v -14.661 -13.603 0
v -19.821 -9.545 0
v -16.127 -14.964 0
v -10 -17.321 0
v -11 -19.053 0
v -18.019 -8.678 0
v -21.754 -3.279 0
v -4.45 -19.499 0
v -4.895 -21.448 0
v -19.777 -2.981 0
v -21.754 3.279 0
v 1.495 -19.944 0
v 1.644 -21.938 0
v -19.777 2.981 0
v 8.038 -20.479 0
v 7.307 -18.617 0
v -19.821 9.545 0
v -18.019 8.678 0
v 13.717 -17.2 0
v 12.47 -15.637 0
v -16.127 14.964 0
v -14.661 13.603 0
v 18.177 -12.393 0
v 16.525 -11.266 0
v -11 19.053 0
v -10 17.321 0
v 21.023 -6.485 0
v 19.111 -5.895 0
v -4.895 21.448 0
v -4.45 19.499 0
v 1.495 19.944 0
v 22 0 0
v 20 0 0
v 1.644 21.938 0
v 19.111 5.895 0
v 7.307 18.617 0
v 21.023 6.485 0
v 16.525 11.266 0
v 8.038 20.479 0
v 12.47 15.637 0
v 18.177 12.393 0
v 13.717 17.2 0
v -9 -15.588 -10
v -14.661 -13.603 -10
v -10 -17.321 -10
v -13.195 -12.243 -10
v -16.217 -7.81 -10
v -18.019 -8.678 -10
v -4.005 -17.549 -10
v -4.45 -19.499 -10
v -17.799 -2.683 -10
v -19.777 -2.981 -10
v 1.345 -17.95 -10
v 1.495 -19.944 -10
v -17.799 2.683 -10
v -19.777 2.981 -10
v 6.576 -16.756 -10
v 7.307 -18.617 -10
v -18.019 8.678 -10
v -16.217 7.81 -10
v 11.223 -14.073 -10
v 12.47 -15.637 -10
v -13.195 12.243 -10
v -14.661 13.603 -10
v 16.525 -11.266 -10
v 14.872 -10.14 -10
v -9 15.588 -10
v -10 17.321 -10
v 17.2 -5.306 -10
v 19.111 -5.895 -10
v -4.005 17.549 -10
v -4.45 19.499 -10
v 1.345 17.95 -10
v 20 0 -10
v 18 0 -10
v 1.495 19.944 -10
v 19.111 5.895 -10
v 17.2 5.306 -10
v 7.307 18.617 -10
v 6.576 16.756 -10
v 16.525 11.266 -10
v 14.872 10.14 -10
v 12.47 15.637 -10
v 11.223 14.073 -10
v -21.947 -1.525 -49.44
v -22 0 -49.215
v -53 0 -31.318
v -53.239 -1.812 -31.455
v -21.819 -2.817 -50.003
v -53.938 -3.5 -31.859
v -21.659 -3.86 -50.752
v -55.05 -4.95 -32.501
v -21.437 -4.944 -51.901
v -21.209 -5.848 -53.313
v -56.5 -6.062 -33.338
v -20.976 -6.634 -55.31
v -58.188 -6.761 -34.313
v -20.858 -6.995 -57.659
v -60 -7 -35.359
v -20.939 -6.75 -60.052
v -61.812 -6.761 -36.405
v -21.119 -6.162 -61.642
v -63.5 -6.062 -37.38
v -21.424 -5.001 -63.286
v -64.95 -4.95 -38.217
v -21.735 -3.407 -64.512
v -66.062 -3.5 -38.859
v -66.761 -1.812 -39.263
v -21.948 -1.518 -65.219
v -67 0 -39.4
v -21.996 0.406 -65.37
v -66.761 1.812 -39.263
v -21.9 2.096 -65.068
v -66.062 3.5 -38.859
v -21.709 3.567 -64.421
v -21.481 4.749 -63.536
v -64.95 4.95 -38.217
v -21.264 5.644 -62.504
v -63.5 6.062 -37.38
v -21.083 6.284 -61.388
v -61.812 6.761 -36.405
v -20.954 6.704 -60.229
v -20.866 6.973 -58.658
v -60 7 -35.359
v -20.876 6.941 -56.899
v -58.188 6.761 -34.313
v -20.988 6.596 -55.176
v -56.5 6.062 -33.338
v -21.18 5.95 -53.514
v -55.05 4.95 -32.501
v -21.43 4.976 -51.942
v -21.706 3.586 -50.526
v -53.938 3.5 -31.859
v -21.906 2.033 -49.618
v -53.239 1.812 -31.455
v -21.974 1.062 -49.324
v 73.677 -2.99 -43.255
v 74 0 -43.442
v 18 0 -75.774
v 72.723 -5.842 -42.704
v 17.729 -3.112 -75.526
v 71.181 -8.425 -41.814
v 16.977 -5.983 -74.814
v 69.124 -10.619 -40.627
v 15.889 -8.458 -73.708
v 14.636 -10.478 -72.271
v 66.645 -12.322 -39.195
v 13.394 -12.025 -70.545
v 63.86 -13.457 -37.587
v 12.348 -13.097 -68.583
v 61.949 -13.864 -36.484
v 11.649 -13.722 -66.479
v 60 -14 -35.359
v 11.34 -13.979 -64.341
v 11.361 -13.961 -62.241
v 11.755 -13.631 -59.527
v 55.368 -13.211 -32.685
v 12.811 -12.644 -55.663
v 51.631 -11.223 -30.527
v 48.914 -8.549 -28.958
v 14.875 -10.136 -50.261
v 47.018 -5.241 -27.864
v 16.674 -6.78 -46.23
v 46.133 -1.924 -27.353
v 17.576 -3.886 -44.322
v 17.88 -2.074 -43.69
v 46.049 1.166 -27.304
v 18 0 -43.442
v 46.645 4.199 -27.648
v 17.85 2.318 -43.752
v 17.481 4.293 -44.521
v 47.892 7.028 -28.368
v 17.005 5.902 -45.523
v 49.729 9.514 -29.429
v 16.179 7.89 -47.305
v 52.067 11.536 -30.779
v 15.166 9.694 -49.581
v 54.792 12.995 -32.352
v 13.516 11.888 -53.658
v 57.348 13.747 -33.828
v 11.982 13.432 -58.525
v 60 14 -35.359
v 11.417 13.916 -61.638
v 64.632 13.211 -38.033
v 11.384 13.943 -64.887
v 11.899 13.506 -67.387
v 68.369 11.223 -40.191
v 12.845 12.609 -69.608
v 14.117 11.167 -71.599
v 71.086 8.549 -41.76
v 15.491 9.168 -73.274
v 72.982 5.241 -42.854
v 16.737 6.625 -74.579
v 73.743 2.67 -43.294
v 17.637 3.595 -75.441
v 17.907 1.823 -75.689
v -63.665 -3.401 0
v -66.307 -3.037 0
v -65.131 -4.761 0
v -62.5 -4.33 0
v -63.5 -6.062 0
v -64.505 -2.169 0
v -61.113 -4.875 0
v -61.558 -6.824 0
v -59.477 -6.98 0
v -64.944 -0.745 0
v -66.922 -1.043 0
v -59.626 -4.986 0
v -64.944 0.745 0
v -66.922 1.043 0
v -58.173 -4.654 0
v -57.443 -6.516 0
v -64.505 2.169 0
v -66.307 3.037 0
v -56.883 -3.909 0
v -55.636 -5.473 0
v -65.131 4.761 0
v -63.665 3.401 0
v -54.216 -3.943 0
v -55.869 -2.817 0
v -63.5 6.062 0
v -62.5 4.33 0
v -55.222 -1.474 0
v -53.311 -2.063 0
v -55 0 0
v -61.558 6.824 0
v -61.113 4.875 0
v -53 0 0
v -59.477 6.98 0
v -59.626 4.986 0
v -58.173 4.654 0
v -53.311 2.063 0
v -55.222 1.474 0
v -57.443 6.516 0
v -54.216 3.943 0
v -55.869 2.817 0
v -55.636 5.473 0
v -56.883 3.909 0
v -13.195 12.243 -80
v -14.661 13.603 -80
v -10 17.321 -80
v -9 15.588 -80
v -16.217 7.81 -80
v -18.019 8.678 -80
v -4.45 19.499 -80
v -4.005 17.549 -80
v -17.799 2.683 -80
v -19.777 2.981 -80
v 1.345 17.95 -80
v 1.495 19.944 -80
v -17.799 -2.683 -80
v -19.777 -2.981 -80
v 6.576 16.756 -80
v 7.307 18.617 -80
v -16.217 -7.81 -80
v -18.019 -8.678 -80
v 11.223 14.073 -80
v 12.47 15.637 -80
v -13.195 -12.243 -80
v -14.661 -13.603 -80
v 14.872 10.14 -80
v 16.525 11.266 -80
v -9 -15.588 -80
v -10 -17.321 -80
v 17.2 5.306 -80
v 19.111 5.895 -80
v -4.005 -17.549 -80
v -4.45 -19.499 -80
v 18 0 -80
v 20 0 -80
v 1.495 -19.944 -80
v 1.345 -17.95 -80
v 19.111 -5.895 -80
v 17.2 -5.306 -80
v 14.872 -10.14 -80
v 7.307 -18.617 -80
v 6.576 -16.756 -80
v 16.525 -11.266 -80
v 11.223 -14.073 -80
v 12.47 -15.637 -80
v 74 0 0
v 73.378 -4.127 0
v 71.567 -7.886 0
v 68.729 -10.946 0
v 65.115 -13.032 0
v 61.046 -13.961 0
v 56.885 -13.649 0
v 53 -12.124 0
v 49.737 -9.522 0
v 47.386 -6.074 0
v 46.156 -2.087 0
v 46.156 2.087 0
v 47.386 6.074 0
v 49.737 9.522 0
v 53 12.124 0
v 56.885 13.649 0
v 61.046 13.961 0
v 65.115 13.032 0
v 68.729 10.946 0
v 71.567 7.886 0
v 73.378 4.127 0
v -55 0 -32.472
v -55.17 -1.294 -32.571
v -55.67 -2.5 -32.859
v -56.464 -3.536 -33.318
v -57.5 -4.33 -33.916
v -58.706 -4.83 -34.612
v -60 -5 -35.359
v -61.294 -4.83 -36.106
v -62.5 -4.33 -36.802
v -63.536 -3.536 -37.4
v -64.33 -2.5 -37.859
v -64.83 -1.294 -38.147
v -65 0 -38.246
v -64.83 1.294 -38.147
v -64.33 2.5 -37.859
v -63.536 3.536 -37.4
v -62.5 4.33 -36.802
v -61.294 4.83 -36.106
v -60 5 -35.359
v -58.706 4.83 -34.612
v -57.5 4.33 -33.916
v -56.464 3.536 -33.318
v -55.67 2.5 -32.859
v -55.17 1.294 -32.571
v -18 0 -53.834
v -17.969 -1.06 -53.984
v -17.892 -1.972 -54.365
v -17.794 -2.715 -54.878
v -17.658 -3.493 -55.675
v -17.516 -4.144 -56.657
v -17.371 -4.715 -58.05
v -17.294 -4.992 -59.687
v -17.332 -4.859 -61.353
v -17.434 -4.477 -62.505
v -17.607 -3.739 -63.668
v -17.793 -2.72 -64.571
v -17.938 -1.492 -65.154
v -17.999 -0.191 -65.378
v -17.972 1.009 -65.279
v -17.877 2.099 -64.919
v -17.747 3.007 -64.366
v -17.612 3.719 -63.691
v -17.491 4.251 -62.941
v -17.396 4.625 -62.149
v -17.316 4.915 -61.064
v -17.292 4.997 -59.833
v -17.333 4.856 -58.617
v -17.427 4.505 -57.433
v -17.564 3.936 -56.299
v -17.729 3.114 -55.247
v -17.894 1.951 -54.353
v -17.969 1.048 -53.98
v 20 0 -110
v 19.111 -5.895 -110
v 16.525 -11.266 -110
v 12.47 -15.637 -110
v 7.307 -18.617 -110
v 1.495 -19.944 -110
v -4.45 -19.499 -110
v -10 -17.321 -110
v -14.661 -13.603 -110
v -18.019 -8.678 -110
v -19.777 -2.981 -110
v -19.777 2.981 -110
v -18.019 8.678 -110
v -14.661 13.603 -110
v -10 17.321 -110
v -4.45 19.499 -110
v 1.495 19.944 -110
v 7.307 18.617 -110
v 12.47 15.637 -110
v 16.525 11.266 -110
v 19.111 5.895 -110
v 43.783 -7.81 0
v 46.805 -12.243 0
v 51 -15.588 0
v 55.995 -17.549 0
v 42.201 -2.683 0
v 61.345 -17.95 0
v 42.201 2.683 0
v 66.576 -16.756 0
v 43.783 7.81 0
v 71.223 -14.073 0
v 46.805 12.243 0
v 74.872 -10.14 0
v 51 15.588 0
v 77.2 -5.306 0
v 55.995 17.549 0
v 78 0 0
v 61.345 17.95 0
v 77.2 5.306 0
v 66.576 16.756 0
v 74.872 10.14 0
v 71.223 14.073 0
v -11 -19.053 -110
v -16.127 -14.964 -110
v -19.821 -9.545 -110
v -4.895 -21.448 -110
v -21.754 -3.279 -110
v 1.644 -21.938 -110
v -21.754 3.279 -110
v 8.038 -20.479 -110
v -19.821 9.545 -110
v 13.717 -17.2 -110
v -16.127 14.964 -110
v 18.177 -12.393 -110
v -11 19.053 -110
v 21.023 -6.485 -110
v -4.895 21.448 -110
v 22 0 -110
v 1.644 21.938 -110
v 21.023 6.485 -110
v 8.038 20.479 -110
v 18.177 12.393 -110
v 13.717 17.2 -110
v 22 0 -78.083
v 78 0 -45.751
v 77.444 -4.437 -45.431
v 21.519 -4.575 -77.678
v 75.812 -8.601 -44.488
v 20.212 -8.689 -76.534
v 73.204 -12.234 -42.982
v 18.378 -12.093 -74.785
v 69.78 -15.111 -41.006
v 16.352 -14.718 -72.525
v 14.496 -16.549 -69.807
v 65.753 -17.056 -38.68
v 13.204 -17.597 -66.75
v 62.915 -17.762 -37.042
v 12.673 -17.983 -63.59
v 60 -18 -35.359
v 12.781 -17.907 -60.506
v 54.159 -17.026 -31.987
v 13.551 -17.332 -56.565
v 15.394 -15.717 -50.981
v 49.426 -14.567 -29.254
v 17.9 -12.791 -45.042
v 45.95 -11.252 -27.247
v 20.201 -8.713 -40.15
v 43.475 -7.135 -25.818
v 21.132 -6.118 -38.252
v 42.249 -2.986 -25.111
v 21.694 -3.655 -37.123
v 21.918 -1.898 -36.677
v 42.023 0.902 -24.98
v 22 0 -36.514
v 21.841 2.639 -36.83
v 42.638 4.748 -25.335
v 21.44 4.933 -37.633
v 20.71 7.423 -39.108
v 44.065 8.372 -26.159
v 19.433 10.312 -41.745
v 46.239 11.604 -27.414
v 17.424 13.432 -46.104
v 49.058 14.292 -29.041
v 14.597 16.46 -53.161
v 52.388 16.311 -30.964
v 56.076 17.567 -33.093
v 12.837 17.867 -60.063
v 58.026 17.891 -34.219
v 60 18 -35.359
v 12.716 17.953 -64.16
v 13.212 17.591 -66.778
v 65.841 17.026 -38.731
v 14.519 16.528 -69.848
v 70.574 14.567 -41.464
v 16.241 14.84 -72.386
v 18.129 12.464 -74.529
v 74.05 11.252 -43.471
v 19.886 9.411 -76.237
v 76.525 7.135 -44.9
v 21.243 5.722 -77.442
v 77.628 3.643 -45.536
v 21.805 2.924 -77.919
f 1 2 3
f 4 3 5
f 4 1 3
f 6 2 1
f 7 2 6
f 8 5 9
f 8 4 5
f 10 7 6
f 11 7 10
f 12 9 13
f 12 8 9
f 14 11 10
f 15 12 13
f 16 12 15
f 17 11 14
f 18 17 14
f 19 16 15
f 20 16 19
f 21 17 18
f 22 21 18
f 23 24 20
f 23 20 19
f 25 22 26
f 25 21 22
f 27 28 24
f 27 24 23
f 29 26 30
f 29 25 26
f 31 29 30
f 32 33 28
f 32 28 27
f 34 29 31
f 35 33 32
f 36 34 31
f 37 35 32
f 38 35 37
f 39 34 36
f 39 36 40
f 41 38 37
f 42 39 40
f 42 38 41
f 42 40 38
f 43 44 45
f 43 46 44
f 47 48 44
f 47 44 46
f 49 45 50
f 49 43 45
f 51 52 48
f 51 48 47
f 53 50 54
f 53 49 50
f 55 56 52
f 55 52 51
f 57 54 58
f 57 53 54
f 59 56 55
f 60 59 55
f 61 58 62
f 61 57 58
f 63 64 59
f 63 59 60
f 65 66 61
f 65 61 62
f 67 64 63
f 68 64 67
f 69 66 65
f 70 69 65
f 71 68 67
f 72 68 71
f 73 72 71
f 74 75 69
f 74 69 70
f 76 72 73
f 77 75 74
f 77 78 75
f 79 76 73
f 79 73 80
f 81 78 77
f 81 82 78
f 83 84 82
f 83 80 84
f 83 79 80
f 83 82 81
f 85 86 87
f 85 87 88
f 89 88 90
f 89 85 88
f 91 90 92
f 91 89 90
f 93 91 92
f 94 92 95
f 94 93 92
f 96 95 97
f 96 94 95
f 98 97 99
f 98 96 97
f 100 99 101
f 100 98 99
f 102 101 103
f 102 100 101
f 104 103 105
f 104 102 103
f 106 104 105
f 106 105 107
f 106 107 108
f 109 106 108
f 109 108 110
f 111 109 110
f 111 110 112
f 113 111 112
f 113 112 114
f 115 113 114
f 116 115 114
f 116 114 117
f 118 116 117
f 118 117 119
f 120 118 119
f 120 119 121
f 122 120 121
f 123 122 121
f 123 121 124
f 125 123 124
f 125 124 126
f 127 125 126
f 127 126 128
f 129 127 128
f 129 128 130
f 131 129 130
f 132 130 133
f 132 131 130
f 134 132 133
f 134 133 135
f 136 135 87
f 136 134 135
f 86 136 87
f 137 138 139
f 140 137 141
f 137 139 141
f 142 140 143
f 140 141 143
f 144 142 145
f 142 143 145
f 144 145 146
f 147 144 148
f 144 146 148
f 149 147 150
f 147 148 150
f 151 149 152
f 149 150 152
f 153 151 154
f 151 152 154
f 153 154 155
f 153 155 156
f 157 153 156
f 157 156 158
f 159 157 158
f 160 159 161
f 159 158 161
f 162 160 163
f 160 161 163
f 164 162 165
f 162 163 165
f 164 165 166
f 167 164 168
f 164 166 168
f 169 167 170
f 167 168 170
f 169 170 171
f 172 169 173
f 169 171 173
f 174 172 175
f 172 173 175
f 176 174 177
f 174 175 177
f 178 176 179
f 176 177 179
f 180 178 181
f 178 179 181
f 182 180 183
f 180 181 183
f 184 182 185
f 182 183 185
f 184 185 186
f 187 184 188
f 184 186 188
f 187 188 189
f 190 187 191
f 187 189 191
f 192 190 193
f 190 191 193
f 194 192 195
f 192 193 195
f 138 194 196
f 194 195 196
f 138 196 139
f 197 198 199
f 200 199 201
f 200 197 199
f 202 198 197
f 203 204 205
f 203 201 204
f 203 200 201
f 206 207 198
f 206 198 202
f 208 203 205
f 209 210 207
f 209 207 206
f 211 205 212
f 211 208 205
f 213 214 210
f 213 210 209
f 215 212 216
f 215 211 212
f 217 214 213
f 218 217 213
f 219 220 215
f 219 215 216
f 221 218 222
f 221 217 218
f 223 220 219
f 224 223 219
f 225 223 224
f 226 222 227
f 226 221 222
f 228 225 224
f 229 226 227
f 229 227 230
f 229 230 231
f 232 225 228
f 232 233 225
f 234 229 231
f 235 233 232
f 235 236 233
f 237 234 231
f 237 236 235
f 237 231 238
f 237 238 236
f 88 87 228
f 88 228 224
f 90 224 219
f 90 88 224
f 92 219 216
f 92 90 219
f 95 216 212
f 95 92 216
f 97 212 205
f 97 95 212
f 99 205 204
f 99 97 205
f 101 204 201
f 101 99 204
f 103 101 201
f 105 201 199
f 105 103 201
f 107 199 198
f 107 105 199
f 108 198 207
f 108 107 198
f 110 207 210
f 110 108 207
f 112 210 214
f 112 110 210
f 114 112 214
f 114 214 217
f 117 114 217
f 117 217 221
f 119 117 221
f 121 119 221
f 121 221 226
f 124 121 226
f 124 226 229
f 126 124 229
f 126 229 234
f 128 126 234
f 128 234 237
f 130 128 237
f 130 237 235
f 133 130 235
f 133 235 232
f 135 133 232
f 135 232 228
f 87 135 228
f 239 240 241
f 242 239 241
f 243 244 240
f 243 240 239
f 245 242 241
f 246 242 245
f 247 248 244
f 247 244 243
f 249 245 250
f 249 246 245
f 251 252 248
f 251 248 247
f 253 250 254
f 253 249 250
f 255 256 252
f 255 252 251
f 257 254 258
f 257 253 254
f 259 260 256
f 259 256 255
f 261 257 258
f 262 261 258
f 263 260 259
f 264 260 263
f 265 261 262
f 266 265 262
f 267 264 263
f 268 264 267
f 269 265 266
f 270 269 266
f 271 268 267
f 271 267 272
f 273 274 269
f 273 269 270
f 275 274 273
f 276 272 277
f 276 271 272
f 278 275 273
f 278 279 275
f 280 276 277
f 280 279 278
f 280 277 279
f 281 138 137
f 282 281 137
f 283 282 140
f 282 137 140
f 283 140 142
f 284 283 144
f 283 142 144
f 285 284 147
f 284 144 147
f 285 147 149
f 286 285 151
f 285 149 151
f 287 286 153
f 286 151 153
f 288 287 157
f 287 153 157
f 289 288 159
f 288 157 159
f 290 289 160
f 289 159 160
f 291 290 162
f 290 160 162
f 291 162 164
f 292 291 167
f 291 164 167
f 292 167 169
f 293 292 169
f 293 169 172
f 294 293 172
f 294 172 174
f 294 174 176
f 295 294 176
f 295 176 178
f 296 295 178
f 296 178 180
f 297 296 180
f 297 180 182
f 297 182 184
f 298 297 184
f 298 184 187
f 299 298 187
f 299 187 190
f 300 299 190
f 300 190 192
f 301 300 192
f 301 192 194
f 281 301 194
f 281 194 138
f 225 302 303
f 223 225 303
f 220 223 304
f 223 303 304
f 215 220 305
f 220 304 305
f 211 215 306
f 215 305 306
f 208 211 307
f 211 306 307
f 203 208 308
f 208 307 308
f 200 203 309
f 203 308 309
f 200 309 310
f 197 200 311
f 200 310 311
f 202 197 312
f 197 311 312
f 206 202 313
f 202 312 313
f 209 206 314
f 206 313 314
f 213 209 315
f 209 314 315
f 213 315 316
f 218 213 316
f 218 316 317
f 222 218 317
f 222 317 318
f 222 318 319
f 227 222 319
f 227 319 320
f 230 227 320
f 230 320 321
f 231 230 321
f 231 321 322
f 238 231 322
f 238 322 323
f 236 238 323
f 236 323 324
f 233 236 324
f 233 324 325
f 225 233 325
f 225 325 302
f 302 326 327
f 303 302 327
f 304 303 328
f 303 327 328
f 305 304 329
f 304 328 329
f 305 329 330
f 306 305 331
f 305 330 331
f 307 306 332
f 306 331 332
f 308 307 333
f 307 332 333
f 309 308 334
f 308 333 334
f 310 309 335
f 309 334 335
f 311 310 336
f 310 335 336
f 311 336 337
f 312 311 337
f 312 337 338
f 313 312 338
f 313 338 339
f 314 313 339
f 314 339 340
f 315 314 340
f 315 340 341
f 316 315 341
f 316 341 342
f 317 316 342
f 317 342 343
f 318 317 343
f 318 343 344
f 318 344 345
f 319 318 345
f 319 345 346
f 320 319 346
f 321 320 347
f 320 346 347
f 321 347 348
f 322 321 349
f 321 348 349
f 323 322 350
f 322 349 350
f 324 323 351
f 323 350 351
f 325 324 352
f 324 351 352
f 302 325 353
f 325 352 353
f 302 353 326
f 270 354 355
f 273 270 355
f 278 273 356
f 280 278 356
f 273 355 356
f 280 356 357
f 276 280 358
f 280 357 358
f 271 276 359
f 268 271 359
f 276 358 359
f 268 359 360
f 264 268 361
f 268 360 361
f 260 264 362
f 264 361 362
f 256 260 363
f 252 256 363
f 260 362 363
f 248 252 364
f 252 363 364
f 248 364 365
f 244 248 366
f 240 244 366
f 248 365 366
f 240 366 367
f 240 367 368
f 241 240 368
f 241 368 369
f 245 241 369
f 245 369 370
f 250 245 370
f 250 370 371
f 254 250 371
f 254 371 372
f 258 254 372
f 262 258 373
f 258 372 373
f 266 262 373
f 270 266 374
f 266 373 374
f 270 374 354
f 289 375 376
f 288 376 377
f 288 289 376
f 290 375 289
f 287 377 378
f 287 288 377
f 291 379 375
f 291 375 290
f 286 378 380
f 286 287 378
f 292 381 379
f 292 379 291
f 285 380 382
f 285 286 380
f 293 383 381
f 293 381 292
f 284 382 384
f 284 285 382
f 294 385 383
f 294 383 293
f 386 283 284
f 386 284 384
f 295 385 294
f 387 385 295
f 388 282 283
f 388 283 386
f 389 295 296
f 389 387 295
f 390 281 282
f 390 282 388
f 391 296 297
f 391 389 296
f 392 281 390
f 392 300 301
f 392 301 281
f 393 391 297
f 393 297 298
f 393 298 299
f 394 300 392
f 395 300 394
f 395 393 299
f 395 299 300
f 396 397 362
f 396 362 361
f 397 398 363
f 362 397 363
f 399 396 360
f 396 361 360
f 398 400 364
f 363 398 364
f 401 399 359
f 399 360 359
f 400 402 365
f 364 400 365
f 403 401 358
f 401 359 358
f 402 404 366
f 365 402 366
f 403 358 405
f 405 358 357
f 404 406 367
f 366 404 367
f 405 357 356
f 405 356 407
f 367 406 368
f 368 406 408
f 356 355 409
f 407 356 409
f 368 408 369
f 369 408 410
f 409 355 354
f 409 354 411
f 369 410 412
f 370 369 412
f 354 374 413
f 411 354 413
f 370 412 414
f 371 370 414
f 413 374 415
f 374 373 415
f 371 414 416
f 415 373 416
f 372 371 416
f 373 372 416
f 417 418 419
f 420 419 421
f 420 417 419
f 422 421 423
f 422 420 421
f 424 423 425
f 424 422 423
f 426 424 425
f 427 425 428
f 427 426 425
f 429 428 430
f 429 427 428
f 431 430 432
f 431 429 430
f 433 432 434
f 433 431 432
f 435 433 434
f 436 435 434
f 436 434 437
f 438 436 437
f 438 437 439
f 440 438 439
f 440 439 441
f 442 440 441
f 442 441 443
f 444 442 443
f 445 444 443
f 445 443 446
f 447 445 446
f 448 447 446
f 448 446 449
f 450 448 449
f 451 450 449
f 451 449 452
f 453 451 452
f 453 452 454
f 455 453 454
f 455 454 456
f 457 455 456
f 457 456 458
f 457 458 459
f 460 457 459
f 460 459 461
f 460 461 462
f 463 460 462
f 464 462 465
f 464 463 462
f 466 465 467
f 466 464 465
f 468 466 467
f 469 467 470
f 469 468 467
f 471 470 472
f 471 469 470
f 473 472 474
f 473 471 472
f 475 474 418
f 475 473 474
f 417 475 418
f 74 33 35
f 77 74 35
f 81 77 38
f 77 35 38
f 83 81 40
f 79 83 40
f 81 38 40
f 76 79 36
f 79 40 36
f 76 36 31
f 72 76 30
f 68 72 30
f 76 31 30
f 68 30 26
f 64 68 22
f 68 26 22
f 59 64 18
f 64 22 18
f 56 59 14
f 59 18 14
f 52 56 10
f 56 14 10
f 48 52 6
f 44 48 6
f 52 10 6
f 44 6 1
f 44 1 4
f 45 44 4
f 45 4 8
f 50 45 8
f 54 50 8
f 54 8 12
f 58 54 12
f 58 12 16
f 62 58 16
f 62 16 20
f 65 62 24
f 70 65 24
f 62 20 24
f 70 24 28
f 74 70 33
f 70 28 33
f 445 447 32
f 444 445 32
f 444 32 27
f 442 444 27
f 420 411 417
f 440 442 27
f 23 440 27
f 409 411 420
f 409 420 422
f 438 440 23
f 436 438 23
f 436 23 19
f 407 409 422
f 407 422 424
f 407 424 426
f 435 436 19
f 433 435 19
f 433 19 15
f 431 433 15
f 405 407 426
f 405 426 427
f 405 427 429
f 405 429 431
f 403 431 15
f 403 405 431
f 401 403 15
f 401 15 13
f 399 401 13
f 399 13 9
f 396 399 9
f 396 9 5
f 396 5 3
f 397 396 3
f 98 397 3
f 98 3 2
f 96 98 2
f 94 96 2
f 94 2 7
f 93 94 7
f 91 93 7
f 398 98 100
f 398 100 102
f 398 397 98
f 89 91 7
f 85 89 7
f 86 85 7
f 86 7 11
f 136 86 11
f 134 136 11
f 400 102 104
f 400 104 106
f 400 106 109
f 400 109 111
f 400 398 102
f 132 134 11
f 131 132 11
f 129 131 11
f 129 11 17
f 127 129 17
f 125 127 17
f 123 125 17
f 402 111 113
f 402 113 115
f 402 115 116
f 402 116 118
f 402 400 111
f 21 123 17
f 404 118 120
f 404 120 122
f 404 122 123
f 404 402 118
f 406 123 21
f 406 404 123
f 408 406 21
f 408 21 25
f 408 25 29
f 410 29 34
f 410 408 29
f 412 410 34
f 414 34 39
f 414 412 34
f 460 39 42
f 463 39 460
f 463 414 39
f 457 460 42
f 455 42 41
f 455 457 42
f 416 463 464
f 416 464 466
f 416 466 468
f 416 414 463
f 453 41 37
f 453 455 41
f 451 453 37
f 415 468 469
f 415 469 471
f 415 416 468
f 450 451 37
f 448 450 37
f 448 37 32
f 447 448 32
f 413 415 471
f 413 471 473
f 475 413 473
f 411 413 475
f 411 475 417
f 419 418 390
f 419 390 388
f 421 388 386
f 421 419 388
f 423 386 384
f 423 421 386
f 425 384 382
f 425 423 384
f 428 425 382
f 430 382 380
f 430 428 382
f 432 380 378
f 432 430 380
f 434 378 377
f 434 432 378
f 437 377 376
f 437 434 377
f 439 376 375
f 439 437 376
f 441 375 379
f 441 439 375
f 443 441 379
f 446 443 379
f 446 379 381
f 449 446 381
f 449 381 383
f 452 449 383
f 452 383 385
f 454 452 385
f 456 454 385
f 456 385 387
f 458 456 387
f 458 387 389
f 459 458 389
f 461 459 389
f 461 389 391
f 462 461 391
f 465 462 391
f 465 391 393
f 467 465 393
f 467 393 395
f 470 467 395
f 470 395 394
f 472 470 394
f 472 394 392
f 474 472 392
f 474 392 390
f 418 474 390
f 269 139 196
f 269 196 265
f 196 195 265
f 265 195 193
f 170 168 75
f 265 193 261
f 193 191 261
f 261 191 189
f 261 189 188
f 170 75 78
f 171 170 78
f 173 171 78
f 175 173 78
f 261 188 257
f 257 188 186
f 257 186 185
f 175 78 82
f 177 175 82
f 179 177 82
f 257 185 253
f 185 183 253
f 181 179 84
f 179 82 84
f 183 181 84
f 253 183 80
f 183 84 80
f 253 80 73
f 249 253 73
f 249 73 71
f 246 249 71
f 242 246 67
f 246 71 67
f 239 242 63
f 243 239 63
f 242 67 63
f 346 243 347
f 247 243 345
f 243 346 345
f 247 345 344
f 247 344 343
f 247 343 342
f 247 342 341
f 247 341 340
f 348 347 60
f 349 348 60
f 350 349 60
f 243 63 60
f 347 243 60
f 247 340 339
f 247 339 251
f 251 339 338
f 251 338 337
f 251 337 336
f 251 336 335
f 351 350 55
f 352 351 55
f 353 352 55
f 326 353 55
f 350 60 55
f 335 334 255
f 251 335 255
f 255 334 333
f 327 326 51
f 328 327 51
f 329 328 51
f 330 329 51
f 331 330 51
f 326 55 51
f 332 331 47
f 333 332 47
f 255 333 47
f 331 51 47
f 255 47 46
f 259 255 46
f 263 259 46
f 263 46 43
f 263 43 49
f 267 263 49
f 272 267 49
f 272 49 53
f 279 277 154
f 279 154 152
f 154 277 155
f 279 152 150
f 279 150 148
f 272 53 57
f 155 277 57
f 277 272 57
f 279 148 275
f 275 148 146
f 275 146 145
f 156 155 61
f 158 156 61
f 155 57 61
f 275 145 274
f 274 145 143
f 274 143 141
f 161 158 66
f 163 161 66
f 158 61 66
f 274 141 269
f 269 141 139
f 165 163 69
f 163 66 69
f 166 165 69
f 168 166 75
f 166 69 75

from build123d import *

# Parameters (mm, degrees)
F1_R      = 22
F1_R_2    = 18
F4_R      = 20
F5_DEPTH  = 30
F7_R      = 20
F7_R_2    = 18
F8_DEPTH  = 10
F9_R      = 14
F1_R_3    = 7
F6_R      = 18
F12_DEPTH = 110.0010001
F13_R     = 5


with BuildPart() as f2:
    # F2: sweep along a path in F0
    with BuildLine(Plane.XZ) as f2_path:
        Line((0, 0), (0, -70))
        Line((0, -70), (0, -110))
    # F1 (on Top) → F2 (sweep)
    with BuildSketch(Plane.XY):
        Circle(F1_R)
    sweep(path=f2_path.line)

    # F3: sweep along a path in F0
    with BuildLine(Plane.XZ) as f3_path:
        Line((60, 0), (60, -35.3589838486))
        Line((60, -35.3589838486), (0, -70))
    # F1 (on Top) → F3 (sweep)
    with BuildSketch(Plane.XY):
        with Locations((60, 0)):
            Circle(F1_R_2)
    sweep(path=f3_path.line, transition=Transition.RIGHT)

    # F4 (on face) → F5 (cut)
    with BuildSketch(Plane(origin=(0, 0, -110), x_dir=(1, 0, 0), z_dir=(0, 0, -1))):
        Circle(F4_R)
    extrude(amount=-F5_DEPTH, mode=Mode.SUBTRACT)

    # F7 (on face) → F8 (cut)
    with BuildSketch(Plane.XY):
        Circle(F7_R)
        Circle(F7_R_2, mode=Mode.SUBTRACT)
    extrude(amount=-F8_DEPTH, mode=Mode.SUBTRACT)

    # F10: sweep along a path in F0
    with BuildLine(Plane.XZ) as f10_path:
        Line((60, 0), (60, -35.3589838486))
        Line((60, -35.3589838486), (0, -70))
    # F9 (on face) → F10 (sweep, cut)
    with BuildSketch(Plane.XY):
        with Locations((60, 0)):
            Circle(F9_R)
    sweep(path=f10_path.line, transition=Transition.RIGHT, mode=Mode.SUBTRACT)

    # F11: sweep along a path in F0
    with BuildLine(Plane.XZ) as f11_path:
        Line((-60, 0), (-60, -35.3589838486))
        Line((-60, -35.3589838486), (0, -70))
    # F1 (on Top) → F11 (sweep)
    with BuildSketch(Plane.XY):
        with Locations((-60, 0)):
            Circle(F1_R_3)
    sweep(path=f11_path.line, transition=Transition.RIGHT)

    # F6 (on face) → F12 (cut, through all)
    with BuildSketch(Plane.XY):
        Circle(F6_R)
    extrude(amount=-F12_DEPTH, mode=Mode.SUBTRACT)

    # F14: sweep along a path in F0
    with BuildLine(Plane.XZ) as f14_path:
        Line((-60, 0), (-60, -35.3589838486))
        Line((-60, -35.3589838486), (0, -70))
    # F13 (on face) → F14 (sweep, cut)
    with BuildSketch(Plane.XY):
        with Locations((-60, 0)):
            Circle(F13_R)
    sweep(path=f14_path.line, transition=Transition.RIGHT, mode=Mode.SUBTRACT)


solid = f2.part
